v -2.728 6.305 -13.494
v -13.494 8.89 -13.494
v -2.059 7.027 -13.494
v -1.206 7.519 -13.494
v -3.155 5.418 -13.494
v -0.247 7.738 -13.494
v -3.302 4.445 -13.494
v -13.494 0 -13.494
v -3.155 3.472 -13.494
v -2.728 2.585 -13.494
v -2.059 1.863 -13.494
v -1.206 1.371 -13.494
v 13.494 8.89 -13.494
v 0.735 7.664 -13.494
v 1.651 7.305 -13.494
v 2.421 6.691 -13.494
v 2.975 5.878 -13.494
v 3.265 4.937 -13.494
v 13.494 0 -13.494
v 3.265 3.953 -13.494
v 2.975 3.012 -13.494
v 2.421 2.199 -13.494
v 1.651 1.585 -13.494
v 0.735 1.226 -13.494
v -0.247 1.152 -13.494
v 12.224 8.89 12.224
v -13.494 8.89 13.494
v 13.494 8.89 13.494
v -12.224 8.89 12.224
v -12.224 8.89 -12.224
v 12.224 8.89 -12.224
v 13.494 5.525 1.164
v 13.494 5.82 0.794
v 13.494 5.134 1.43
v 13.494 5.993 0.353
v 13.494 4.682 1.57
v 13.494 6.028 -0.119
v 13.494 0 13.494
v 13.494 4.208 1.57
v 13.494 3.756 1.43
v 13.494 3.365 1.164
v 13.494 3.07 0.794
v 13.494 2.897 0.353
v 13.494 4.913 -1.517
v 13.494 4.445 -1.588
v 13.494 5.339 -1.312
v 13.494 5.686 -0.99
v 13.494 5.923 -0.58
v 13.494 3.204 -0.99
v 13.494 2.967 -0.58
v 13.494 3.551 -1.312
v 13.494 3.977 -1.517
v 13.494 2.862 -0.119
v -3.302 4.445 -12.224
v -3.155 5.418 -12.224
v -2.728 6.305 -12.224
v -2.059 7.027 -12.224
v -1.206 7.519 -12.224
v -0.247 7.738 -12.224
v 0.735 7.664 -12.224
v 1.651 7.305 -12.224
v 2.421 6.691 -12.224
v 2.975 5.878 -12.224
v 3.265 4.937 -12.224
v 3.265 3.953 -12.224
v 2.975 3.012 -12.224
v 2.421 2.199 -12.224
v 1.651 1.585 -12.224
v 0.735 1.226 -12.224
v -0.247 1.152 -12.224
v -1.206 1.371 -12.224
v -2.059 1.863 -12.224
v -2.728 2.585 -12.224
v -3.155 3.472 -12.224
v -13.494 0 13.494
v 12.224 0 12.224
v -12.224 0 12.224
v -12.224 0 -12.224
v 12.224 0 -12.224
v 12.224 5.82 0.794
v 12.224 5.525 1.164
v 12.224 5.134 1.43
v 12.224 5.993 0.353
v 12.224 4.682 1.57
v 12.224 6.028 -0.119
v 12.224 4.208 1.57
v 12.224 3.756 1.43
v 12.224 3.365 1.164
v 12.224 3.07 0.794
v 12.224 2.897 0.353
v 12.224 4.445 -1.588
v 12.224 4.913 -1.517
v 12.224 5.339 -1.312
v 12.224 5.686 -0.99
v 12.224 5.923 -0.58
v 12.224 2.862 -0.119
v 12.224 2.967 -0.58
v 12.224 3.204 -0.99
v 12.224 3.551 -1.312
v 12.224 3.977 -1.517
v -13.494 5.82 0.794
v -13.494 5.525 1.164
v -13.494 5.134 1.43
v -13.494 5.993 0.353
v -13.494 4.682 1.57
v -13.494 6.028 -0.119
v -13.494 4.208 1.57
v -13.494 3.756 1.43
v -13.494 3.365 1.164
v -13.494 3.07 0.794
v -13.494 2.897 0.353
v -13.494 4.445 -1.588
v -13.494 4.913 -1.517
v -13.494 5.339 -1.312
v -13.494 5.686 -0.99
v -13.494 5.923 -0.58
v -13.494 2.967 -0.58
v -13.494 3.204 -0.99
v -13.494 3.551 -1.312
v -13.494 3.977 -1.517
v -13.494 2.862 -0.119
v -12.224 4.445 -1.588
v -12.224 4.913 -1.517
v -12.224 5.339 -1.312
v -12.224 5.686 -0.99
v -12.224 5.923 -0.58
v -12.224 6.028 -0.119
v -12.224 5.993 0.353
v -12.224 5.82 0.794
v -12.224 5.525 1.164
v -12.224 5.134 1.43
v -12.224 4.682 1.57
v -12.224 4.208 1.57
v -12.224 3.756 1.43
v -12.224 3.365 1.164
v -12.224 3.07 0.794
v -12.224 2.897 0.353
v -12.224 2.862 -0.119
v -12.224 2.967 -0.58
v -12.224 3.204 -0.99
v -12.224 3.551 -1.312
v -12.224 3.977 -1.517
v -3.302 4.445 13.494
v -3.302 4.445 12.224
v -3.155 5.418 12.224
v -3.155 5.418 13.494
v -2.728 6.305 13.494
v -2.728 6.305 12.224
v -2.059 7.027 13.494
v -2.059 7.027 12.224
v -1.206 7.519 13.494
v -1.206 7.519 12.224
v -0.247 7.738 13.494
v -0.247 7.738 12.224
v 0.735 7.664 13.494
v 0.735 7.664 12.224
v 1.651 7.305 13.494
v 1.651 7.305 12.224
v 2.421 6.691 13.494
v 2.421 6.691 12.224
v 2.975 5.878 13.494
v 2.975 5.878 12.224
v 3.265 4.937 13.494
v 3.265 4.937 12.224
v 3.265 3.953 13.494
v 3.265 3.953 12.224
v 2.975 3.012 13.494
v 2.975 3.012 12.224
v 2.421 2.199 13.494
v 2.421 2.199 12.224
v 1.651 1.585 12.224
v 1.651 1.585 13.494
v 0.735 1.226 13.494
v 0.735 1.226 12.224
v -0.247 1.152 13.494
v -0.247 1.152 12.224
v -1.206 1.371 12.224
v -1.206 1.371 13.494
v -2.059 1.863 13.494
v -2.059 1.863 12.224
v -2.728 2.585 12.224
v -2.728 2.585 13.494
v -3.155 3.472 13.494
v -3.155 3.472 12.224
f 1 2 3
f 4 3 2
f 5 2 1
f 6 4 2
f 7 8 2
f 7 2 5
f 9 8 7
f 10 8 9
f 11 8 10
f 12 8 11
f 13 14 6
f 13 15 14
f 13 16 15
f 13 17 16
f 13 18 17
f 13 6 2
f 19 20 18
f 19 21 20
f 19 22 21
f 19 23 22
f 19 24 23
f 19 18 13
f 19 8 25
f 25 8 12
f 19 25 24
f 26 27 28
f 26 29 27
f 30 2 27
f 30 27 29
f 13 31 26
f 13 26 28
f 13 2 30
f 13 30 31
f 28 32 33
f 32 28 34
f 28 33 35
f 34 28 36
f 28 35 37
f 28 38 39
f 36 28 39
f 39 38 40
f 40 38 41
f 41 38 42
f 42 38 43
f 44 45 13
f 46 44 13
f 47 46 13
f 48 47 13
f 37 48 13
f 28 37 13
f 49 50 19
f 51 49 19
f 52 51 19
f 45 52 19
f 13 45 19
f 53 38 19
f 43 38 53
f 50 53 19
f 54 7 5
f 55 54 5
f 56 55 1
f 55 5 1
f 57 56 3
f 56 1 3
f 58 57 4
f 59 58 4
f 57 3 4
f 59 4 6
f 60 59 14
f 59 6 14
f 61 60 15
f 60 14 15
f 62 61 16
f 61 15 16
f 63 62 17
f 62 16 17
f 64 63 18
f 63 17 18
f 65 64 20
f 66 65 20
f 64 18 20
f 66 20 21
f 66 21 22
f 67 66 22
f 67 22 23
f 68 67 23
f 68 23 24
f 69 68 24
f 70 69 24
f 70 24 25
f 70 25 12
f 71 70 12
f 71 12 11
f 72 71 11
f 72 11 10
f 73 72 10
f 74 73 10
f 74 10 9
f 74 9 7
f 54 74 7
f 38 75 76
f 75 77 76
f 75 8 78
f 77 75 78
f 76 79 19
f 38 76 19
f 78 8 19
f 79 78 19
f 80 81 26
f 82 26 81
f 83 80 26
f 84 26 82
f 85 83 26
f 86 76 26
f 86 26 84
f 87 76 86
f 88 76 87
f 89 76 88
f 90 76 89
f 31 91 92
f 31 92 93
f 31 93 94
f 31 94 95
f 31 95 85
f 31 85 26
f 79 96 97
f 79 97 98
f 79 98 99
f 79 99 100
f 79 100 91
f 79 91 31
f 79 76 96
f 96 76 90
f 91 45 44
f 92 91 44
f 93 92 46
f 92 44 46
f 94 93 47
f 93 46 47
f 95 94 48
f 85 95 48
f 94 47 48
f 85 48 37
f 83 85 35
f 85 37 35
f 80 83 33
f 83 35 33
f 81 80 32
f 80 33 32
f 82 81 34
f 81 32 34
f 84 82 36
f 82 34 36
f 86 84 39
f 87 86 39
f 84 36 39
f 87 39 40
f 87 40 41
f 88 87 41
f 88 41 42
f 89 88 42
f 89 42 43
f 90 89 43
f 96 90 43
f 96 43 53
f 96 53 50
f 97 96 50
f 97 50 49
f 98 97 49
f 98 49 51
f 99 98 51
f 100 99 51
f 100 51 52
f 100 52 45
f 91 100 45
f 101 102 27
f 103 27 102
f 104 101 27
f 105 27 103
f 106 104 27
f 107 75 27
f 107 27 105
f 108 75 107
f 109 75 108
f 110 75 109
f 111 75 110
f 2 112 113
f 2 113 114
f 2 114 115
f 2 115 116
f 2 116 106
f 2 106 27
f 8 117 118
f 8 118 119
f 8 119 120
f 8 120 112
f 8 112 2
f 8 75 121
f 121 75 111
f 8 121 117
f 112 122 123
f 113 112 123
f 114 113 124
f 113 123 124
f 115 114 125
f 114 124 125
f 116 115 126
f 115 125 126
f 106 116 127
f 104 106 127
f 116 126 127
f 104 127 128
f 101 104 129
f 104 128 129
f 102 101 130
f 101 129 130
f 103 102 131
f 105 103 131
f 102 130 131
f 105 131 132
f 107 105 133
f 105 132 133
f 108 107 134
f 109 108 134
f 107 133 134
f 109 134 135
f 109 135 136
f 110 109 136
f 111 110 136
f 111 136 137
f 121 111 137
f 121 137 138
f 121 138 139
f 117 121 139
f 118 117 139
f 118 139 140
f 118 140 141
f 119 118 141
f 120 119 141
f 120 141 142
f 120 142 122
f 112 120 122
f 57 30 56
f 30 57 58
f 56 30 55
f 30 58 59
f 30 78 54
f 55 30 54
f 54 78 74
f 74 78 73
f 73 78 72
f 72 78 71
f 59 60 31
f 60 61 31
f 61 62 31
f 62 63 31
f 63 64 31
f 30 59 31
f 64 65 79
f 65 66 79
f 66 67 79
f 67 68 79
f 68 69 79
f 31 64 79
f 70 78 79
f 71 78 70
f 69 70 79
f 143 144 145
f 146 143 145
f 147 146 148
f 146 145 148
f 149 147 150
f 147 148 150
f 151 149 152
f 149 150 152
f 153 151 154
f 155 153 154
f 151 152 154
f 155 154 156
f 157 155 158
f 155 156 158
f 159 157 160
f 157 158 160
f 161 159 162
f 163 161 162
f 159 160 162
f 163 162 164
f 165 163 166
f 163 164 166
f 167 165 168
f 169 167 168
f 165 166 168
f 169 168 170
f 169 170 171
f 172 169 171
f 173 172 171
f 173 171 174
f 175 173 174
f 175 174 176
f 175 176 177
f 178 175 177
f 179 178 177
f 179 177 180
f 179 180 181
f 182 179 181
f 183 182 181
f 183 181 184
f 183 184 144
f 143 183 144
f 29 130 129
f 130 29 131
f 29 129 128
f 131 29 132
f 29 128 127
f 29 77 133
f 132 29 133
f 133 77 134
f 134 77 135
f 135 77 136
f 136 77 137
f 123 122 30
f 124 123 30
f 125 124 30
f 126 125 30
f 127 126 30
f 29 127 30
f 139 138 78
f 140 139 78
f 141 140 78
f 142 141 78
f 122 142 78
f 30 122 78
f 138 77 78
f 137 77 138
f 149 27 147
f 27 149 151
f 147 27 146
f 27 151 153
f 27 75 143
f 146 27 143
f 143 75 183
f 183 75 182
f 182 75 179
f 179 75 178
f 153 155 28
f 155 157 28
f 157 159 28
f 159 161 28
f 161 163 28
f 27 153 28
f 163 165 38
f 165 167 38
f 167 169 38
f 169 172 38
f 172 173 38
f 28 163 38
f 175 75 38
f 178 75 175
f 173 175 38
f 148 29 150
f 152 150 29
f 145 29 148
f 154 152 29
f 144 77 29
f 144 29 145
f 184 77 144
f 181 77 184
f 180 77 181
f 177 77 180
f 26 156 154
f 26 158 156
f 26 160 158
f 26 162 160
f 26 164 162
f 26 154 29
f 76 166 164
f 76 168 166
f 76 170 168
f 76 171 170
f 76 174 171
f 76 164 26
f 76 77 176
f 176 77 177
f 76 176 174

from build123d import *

# Parameters (mm, degrees)
SKETCH1_W           = 26.9875
SKETCH1_H           = 26.9875
SKETCH1_W_2         = 24.4475
SKETCH1_H_2         = 24.4475
BOSS_EXTRUDE1_DEPTH = 8.89
SKETCH2_R           = 1.5875
CUT_EXTRUDE1_DEPTH  = 152.4
SKETCH3_R           = 3.302
CUT_EXTRUDE3_DEPTH  = 152.4


with BuildPart() as part:
    # Sketch1 → Boss-Extrude1 (new body)
    with BuildSketch(Plane(origin=(0, 0, 0), x_dir=(1, 0, 0), z_dir=(0, 1, 0))):
        Rectangle(SKETCH1_W, SKETCH1_H)
        Rectangle(SKETCH1_W_2, SKETCH1_H_2, mode=Mode.SUBTRACT)
    extrude(amount=BOSS_EXTRUDE1_DEPTH)

    # Sketch2 → Cut-Extrude1 (cut)
    with BuildSketch(Plane(origin=(13.49375, 0, 0), x_dir=(0, 0, -1), z_dir=(1, 0, 0))):
        with Locations((0, 4.445)):
            Circle(SKETCH2_R)
    extrude(amount=-CUT_EXTRUDE1_DEPTH, mode=Mode.SUBTRACT)

    # Sketch3 → Cut-Extrude3 (cut)
    with BuildSketch(Plane(origin=(0, 0, -13.49375), x_dir=(-1, 0, 0), z_dir=(0, 0, -1))):
        with Locations((0, 4.445)):
            Circle(SKETCH3_R)
    extrude(amount=-CUT_EXTRUDE3_DEPTH, mode=Mode.SUBTRACT)


solid = part.part
